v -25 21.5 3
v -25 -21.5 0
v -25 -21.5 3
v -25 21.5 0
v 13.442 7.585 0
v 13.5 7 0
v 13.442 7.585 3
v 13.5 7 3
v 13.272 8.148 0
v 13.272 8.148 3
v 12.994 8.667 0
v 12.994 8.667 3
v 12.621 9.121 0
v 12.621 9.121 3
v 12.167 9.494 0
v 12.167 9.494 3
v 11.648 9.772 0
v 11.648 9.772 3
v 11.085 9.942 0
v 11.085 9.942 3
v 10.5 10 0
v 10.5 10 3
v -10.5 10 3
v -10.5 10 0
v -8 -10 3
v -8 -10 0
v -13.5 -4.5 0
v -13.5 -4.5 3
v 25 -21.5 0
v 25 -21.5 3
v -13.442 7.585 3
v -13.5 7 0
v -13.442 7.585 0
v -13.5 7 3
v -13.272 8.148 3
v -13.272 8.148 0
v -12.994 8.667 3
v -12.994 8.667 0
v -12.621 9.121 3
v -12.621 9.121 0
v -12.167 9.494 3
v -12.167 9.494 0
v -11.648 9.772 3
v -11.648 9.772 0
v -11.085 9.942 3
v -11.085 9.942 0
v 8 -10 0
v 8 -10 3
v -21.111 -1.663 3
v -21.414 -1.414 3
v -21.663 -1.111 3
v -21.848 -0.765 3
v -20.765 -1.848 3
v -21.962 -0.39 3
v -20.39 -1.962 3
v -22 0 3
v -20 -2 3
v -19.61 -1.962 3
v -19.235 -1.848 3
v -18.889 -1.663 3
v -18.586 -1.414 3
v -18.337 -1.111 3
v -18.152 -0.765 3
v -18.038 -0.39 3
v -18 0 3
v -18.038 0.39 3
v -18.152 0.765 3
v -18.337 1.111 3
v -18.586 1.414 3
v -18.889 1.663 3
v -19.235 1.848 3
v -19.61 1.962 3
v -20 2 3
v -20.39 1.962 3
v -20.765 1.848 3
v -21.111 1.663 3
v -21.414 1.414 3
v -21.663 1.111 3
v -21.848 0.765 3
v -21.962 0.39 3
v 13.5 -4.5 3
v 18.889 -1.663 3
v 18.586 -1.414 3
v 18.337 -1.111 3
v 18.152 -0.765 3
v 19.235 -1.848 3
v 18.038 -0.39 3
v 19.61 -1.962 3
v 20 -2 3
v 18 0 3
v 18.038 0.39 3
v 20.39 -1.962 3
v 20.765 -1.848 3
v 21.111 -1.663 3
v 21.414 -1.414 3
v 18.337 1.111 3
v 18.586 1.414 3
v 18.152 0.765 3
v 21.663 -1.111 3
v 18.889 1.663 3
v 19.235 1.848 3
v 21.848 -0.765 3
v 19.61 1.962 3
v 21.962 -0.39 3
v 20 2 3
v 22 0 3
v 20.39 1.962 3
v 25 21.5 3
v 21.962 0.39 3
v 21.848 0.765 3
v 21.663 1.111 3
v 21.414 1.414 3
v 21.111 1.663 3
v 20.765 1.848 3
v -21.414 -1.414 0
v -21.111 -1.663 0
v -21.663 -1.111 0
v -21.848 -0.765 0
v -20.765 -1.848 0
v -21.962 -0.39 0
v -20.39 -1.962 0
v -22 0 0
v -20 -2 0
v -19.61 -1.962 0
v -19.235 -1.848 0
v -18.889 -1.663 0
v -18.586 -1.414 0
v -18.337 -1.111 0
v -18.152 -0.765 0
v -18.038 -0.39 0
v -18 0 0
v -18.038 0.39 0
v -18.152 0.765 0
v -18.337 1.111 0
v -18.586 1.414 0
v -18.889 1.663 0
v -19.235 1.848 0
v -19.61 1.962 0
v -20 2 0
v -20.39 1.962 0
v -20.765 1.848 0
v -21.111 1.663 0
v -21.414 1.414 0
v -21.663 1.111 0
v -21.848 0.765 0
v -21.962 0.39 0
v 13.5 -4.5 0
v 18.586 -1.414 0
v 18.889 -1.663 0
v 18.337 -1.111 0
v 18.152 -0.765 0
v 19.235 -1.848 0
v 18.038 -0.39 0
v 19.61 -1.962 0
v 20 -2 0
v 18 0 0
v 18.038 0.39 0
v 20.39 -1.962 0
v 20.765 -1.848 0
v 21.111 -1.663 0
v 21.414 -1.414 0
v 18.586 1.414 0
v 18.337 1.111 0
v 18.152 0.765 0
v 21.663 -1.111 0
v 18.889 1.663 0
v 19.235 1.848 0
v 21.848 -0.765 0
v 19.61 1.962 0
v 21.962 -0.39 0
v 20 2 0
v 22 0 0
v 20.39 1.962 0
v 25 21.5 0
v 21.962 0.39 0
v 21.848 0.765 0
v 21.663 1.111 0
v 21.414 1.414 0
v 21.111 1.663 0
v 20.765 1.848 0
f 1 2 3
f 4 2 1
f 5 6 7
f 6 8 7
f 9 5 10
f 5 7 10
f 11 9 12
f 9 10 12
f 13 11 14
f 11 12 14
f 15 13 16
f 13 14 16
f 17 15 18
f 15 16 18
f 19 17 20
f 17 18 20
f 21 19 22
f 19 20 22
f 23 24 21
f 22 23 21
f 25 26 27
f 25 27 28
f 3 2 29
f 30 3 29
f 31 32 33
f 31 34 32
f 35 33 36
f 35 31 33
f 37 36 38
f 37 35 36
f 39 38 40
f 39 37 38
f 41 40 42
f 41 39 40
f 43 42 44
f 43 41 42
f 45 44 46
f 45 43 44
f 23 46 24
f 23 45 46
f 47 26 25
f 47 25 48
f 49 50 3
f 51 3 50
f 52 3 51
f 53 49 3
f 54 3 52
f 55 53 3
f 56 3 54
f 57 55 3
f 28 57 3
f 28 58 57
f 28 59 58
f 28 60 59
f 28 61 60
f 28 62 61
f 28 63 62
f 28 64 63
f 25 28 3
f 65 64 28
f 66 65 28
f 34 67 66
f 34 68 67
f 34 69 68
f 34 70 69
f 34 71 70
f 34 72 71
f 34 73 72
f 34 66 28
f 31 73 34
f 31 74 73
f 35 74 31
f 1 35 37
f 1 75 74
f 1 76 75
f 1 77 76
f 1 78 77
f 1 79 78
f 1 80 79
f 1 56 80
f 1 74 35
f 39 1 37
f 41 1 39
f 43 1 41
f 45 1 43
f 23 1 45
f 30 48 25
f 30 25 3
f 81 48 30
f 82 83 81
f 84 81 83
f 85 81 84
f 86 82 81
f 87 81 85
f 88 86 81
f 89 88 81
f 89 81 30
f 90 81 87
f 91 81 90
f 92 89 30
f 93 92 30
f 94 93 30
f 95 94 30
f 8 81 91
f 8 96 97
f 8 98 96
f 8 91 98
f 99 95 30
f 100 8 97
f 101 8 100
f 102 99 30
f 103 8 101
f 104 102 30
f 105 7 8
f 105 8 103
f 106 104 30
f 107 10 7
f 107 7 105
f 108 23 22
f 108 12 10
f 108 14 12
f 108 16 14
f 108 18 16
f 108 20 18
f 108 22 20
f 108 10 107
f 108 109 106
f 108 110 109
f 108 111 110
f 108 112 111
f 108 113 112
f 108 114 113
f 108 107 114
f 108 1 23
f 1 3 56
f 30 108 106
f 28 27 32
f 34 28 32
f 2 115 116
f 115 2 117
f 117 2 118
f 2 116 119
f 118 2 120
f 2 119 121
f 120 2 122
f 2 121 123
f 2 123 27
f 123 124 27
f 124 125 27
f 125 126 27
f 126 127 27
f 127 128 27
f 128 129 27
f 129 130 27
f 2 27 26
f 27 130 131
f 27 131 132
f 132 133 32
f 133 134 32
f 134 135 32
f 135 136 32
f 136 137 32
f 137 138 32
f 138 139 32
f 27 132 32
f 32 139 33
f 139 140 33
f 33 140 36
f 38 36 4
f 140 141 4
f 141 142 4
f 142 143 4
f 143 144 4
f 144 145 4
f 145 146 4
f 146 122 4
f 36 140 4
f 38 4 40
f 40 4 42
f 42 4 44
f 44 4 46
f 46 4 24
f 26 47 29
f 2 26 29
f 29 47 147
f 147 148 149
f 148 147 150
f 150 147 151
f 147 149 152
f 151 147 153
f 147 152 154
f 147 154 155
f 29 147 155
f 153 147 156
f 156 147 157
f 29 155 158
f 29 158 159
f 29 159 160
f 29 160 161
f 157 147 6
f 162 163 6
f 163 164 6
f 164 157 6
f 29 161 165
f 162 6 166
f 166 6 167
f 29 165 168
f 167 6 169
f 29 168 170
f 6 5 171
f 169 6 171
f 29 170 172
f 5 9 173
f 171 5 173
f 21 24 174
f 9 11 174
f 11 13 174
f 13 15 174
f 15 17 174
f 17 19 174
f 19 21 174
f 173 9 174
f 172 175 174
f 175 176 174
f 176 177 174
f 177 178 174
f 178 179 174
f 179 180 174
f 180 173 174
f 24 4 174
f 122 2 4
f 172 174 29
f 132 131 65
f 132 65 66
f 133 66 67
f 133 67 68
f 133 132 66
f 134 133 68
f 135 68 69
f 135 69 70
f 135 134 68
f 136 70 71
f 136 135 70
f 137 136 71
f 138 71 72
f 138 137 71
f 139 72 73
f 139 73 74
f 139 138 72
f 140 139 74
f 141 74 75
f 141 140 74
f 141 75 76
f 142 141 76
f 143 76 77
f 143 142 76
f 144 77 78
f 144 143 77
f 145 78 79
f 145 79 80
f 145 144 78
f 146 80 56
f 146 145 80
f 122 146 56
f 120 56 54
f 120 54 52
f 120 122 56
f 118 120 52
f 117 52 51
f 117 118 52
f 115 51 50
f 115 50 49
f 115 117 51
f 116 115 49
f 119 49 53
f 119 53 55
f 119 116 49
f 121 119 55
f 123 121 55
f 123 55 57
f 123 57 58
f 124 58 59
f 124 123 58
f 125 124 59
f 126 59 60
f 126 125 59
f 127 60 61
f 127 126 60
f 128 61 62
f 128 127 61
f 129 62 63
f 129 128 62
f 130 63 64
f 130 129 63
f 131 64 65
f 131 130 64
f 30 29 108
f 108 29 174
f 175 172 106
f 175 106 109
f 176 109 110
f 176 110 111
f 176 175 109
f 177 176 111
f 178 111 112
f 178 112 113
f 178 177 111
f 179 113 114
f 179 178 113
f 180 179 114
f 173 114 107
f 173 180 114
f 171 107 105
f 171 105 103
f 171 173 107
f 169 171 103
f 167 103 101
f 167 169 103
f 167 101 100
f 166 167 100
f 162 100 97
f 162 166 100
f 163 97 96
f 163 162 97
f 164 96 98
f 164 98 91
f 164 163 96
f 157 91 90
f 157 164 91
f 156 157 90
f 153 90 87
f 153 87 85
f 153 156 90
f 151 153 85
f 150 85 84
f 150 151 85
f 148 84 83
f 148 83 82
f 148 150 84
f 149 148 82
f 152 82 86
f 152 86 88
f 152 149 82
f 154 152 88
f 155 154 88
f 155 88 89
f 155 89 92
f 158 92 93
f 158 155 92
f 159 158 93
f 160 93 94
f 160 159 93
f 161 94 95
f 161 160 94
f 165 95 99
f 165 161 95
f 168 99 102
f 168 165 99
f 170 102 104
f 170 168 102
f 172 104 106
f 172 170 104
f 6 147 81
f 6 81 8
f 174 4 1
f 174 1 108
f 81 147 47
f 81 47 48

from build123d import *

# Parameters (mm, degrees)
F0_W     = 50
F0_H     = 43
F0_R     = 2
F0_W_2   = 27
F0_H_2   = 20
F1_DEPTH = 3
F2_R     = 3
F3_SIZE  = 5.5


with BuildPart() as f1:
    # F0 (on Top) → F1 (new body)
    with BuildSketch(Plane.XY):
        Rectangle(F0_W, F0_H)
        with Locations((-20, 0)):
            Circle(F0_R, mode=Mode.SUBTRACT)
        Rectangle(F0_W_2, F0_H_2, mode=Mode.SUBTRACT)
        with Locations((20, 0)):
            Circle(F0_R, mode=Mode.SUBTRACT)
    extrude(amount=F1_DEPTH)

    # F2
    f2_edges = [f1.edges().sort_by_distance(p)[0] for p in [
        (-13.5, 10, 1.5),
        (13.5, 10, 1.5),
    ]]
    fillet(f2_edges, radius=F2_R)

    # F3
    f3_edges = [f1.edges().sort_by_distance(p)[0] for p in [
        (-13.5, -10, 1.5),
        (13.5, -10, 1.5),
    ]]
    chamfer(f3_edges, length=F3_SIZE)


solid = f1.part
